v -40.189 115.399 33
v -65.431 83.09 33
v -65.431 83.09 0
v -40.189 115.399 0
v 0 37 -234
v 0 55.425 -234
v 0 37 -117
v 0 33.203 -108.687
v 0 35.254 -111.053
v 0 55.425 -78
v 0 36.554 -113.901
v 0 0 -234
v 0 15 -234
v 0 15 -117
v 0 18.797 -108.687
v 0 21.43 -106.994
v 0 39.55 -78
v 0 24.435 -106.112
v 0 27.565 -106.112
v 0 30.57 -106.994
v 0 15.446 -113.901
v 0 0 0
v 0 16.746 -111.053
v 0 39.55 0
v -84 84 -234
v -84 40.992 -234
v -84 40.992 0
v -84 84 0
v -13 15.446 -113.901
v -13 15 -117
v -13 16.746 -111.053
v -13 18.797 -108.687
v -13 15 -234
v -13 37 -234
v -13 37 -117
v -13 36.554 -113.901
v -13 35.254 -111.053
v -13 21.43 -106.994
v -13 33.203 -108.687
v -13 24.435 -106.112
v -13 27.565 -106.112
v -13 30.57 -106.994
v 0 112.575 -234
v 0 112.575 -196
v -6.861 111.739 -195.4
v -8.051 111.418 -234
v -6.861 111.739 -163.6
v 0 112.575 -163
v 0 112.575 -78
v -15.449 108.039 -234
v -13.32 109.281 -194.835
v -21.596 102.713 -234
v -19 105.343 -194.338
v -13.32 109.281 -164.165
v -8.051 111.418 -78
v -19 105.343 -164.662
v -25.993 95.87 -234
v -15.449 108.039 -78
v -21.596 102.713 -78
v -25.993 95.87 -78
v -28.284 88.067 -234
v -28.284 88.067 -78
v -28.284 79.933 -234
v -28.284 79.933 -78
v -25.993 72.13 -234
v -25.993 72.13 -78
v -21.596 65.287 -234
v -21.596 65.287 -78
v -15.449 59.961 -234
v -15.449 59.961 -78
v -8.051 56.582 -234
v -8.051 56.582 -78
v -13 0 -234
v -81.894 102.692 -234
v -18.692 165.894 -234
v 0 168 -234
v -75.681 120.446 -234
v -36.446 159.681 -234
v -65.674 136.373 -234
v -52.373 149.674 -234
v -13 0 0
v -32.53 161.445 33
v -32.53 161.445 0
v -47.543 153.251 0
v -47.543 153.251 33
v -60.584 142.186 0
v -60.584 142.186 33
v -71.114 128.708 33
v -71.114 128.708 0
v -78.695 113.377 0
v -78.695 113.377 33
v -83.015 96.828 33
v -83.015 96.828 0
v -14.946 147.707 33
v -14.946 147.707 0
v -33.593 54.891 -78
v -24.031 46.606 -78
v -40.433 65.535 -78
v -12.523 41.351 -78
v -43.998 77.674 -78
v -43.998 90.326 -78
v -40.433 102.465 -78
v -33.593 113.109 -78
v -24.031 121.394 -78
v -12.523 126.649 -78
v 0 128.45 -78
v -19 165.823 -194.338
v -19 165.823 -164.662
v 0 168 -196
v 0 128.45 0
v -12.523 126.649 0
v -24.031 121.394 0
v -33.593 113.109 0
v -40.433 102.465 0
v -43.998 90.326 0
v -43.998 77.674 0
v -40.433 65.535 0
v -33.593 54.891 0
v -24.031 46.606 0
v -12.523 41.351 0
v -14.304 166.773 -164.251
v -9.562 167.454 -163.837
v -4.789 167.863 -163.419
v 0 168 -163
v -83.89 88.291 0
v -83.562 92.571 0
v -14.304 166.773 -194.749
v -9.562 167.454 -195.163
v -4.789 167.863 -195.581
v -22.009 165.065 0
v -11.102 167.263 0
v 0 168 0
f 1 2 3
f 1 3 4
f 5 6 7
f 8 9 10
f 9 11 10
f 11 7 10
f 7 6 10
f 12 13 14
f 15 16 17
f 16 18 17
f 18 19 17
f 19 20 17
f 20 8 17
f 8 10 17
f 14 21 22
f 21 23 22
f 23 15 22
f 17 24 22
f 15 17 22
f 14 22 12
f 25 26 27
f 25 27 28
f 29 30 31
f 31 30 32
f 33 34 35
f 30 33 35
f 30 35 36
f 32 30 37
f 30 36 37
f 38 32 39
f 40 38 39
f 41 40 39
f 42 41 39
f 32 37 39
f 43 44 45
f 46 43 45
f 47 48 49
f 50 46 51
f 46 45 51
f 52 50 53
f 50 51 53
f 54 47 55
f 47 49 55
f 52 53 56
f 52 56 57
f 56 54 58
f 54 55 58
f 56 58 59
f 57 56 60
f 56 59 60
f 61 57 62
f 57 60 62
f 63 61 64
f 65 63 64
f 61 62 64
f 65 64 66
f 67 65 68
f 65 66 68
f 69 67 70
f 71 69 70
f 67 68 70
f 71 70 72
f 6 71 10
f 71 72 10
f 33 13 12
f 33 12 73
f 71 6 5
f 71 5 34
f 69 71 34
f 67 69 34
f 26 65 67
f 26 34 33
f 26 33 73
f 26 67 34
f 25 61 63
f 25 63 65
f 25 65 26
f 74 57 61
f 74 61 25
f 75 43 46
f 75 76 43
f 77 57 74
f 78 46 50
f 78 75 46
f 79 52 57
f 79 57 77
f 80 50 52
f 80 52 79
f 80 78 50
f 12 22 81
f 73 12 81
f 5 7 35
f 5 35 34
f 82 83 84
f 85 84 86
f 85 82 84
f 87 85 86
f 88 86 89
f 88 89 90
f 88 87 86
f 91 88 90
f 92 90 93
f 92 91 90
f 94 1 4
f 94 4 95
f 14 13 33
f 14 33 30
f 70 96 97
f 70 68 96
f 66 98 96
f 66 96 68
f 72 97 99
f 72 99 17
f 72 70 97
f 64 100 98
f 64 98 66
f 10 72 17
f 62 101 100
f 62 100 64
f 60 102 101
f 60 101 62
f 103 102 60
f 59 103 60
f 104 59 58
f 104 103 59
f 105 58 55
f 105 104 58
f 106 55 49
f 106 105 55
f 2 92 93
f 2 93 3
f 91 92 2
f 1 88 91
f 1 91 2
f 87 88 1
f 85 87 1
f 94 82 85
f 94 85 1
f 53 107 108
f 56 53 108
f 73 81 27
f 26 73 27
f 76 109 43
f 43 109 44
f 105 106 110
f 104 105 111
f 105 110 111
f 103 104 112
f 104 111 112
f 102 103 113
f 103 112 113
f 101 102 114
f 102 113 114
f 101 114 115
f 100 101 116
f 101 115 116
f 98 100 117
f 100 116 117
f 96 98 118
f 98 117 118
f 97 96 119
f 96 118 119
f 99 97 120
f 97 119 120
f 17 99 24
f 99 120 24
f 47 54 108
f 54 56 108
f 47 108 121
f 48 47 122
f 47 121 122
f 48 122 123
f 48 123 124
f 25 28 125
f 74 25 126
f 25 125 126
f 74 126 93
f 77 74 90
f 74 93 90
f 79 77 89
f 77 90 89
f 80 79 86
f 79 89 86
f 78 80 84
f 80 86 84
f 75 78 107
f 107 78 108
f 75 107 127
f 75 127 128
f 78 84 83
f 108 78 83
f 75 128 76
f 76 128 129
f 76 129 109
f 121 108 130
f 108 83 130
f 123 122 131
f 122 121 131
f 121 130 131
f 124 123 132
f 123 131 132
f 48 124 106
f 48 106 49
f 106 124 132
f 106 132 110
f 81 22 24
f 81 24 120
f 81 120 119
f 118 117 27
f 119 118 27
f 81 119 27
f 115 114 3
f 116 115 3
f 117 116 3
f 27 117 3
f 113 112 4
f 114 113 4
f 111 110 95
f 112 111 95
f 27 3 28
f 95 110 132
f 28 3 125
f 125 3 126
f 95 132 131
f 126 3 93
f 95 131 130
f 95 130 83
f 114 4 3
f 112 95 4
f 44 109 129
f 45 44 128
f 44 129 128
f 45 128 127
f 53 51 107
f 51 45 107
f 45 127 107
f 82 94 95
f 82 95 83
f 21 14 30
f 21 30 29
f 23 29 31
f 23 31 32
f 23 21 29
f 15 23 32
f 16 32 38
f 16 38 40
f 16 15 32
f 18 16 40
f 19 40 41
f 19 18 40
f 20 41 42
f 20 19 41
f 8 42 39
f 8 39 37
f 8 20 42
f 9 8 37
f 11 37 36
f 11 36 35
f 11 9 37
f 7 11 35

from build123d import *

# Parameters (mm, degrees)
BOSS_EXTRUDE1_DEPTH     = 234
SKETCH2_R               = 44.45
CUT_EXTRUDE2_DEPTH      = 78
SKETCH3_R               = 28.575
CUT_EXTRUDE3_DEPTH      = 301.059994001
CUT_EXTRUDE4_DEPTH      = 13
BOSS_EXTRUDE2_START     = 33
BOSS_EXTRUDE2_DEPTH     = 33
CUT_EXTRUDE6_REACH      = 302.06
CUT_EXTRUDE6_END_RADIUS = 28.575


with BuildPart() as part:
    # Sketch1 → Boss-Extrude1 (new body)
    with BuildSketch(Plane.XY):
        with BuildLine():
            Line((0, 0), (-13, 0))
            Line((-13, 0), (-84, 40.991869112))
            Line((-84, 40.991869112), (-84, 84))
            ThreePointArc((-84, 84), (-59.39696962, 143.39696962), (0, 168))
            Line((0, 168), (0, 0))
        make_face()
    extrude(amount=-BOSS_EXTRUDE1_DEPTH)

    # Sketch2 → Cut-Extrude2 (cut)
    with BuildSketch(Plane.XY):
        with Locations((0, 84)):
            Circle(SKETCH2_R)
    extrude(amount=-CUT_EXTRUDE2_DEPTH, mode=Mode.SUBTRACT)

    # Sketch3 → Cut-Extrude3 (cut, through all)
    with BuildSketch(Plane.XY):
        with Locations((0, 84)):
            Circle(SKETCH3_R)
    extrude(amount=-CUT_EXTRUDE3_DEPTH, mode=Mode.SUBTRACT)

    # Sketch5 → Cut-Extrude4 (cut)
    with BuildSketch(Plane(origin=(0, 0, 0), x_dir=(0, 0, -1), z_dir=(1, 0, 0))):
        with BuildLine():
            Line((234, 15), (117, 15))
            ThreePointArc((117, 15), (106, 26), (117, 37))
            Line((117, 37), (234, 37))
            ThreePointArc((234, 37), (245, 26), (234, 15))
        make_face()
    extrude(amount=-CUT_EXTRUDE4_DEPTH, mode=Mode.SUBTRACT)

    # Sketch6 → Boss-Extrude2 (add)
    with BuildSketch(Plane.XY.offset(BOSS_EXTRUDE2_START)):
        with BuildLine():
            Line((-40.188548434, 115.398735242), (-14.946427946, 147.707176139))
            Line((-14.946427946, 147.707176139), (-32.530408402, 161.445287327))
            ThreePointArc((-32.530408402, 161.445287327), (-66.192903303, 135.715563927), (-83.014649379, 96.828405531))
            Line((-83.014649379, 96.828405531), (-65.430668922, 83.090294344))
            Line((-65.430668922, 83.090294344), (-40.188548434, 115.398735242))
        make_face()
    extrude(amount=-BOSS_EXTRUDE2_DEPTH)

    # Cut-Extrude6: up to this cylinder (the profile starts outside it)
    cut_extrude6_end = Plane(origin=(0, 84, -179.5), z_dir=(0, 0, 1)) * Cylinder(CUT_EXTRUDE6_END_RADIUS, 662.27, mode=Mode.PRIVATE)
    # Sketch7 → Cut-Extrude6 (cut, up to the surface)
    with BuildSketch(Plane(origin=(0, 168, 0), x_dir=(1, 0, 0), z_dir=(0, 1, 0)), mode=Mode.PRIVATE) as cut_extrude6_sk1:
        Polygon((0, 196), (-19, 194.337715393), (-19, 164.662284607), (0, 163), align=None)
    cut_extrude6_tool1 = extrude(cut_extrude6_sk1.sketch, amount=-CUT_EXTRUDE6_REACH, mode=Mode.PRIVATE) - cut_extrude6_end
    add(cut_extrude6_tool1.solids().sort_by_distance((-9.332027, 168, -179.5))[0], mode=Mode.SUBTRACT)


solid = part.part
